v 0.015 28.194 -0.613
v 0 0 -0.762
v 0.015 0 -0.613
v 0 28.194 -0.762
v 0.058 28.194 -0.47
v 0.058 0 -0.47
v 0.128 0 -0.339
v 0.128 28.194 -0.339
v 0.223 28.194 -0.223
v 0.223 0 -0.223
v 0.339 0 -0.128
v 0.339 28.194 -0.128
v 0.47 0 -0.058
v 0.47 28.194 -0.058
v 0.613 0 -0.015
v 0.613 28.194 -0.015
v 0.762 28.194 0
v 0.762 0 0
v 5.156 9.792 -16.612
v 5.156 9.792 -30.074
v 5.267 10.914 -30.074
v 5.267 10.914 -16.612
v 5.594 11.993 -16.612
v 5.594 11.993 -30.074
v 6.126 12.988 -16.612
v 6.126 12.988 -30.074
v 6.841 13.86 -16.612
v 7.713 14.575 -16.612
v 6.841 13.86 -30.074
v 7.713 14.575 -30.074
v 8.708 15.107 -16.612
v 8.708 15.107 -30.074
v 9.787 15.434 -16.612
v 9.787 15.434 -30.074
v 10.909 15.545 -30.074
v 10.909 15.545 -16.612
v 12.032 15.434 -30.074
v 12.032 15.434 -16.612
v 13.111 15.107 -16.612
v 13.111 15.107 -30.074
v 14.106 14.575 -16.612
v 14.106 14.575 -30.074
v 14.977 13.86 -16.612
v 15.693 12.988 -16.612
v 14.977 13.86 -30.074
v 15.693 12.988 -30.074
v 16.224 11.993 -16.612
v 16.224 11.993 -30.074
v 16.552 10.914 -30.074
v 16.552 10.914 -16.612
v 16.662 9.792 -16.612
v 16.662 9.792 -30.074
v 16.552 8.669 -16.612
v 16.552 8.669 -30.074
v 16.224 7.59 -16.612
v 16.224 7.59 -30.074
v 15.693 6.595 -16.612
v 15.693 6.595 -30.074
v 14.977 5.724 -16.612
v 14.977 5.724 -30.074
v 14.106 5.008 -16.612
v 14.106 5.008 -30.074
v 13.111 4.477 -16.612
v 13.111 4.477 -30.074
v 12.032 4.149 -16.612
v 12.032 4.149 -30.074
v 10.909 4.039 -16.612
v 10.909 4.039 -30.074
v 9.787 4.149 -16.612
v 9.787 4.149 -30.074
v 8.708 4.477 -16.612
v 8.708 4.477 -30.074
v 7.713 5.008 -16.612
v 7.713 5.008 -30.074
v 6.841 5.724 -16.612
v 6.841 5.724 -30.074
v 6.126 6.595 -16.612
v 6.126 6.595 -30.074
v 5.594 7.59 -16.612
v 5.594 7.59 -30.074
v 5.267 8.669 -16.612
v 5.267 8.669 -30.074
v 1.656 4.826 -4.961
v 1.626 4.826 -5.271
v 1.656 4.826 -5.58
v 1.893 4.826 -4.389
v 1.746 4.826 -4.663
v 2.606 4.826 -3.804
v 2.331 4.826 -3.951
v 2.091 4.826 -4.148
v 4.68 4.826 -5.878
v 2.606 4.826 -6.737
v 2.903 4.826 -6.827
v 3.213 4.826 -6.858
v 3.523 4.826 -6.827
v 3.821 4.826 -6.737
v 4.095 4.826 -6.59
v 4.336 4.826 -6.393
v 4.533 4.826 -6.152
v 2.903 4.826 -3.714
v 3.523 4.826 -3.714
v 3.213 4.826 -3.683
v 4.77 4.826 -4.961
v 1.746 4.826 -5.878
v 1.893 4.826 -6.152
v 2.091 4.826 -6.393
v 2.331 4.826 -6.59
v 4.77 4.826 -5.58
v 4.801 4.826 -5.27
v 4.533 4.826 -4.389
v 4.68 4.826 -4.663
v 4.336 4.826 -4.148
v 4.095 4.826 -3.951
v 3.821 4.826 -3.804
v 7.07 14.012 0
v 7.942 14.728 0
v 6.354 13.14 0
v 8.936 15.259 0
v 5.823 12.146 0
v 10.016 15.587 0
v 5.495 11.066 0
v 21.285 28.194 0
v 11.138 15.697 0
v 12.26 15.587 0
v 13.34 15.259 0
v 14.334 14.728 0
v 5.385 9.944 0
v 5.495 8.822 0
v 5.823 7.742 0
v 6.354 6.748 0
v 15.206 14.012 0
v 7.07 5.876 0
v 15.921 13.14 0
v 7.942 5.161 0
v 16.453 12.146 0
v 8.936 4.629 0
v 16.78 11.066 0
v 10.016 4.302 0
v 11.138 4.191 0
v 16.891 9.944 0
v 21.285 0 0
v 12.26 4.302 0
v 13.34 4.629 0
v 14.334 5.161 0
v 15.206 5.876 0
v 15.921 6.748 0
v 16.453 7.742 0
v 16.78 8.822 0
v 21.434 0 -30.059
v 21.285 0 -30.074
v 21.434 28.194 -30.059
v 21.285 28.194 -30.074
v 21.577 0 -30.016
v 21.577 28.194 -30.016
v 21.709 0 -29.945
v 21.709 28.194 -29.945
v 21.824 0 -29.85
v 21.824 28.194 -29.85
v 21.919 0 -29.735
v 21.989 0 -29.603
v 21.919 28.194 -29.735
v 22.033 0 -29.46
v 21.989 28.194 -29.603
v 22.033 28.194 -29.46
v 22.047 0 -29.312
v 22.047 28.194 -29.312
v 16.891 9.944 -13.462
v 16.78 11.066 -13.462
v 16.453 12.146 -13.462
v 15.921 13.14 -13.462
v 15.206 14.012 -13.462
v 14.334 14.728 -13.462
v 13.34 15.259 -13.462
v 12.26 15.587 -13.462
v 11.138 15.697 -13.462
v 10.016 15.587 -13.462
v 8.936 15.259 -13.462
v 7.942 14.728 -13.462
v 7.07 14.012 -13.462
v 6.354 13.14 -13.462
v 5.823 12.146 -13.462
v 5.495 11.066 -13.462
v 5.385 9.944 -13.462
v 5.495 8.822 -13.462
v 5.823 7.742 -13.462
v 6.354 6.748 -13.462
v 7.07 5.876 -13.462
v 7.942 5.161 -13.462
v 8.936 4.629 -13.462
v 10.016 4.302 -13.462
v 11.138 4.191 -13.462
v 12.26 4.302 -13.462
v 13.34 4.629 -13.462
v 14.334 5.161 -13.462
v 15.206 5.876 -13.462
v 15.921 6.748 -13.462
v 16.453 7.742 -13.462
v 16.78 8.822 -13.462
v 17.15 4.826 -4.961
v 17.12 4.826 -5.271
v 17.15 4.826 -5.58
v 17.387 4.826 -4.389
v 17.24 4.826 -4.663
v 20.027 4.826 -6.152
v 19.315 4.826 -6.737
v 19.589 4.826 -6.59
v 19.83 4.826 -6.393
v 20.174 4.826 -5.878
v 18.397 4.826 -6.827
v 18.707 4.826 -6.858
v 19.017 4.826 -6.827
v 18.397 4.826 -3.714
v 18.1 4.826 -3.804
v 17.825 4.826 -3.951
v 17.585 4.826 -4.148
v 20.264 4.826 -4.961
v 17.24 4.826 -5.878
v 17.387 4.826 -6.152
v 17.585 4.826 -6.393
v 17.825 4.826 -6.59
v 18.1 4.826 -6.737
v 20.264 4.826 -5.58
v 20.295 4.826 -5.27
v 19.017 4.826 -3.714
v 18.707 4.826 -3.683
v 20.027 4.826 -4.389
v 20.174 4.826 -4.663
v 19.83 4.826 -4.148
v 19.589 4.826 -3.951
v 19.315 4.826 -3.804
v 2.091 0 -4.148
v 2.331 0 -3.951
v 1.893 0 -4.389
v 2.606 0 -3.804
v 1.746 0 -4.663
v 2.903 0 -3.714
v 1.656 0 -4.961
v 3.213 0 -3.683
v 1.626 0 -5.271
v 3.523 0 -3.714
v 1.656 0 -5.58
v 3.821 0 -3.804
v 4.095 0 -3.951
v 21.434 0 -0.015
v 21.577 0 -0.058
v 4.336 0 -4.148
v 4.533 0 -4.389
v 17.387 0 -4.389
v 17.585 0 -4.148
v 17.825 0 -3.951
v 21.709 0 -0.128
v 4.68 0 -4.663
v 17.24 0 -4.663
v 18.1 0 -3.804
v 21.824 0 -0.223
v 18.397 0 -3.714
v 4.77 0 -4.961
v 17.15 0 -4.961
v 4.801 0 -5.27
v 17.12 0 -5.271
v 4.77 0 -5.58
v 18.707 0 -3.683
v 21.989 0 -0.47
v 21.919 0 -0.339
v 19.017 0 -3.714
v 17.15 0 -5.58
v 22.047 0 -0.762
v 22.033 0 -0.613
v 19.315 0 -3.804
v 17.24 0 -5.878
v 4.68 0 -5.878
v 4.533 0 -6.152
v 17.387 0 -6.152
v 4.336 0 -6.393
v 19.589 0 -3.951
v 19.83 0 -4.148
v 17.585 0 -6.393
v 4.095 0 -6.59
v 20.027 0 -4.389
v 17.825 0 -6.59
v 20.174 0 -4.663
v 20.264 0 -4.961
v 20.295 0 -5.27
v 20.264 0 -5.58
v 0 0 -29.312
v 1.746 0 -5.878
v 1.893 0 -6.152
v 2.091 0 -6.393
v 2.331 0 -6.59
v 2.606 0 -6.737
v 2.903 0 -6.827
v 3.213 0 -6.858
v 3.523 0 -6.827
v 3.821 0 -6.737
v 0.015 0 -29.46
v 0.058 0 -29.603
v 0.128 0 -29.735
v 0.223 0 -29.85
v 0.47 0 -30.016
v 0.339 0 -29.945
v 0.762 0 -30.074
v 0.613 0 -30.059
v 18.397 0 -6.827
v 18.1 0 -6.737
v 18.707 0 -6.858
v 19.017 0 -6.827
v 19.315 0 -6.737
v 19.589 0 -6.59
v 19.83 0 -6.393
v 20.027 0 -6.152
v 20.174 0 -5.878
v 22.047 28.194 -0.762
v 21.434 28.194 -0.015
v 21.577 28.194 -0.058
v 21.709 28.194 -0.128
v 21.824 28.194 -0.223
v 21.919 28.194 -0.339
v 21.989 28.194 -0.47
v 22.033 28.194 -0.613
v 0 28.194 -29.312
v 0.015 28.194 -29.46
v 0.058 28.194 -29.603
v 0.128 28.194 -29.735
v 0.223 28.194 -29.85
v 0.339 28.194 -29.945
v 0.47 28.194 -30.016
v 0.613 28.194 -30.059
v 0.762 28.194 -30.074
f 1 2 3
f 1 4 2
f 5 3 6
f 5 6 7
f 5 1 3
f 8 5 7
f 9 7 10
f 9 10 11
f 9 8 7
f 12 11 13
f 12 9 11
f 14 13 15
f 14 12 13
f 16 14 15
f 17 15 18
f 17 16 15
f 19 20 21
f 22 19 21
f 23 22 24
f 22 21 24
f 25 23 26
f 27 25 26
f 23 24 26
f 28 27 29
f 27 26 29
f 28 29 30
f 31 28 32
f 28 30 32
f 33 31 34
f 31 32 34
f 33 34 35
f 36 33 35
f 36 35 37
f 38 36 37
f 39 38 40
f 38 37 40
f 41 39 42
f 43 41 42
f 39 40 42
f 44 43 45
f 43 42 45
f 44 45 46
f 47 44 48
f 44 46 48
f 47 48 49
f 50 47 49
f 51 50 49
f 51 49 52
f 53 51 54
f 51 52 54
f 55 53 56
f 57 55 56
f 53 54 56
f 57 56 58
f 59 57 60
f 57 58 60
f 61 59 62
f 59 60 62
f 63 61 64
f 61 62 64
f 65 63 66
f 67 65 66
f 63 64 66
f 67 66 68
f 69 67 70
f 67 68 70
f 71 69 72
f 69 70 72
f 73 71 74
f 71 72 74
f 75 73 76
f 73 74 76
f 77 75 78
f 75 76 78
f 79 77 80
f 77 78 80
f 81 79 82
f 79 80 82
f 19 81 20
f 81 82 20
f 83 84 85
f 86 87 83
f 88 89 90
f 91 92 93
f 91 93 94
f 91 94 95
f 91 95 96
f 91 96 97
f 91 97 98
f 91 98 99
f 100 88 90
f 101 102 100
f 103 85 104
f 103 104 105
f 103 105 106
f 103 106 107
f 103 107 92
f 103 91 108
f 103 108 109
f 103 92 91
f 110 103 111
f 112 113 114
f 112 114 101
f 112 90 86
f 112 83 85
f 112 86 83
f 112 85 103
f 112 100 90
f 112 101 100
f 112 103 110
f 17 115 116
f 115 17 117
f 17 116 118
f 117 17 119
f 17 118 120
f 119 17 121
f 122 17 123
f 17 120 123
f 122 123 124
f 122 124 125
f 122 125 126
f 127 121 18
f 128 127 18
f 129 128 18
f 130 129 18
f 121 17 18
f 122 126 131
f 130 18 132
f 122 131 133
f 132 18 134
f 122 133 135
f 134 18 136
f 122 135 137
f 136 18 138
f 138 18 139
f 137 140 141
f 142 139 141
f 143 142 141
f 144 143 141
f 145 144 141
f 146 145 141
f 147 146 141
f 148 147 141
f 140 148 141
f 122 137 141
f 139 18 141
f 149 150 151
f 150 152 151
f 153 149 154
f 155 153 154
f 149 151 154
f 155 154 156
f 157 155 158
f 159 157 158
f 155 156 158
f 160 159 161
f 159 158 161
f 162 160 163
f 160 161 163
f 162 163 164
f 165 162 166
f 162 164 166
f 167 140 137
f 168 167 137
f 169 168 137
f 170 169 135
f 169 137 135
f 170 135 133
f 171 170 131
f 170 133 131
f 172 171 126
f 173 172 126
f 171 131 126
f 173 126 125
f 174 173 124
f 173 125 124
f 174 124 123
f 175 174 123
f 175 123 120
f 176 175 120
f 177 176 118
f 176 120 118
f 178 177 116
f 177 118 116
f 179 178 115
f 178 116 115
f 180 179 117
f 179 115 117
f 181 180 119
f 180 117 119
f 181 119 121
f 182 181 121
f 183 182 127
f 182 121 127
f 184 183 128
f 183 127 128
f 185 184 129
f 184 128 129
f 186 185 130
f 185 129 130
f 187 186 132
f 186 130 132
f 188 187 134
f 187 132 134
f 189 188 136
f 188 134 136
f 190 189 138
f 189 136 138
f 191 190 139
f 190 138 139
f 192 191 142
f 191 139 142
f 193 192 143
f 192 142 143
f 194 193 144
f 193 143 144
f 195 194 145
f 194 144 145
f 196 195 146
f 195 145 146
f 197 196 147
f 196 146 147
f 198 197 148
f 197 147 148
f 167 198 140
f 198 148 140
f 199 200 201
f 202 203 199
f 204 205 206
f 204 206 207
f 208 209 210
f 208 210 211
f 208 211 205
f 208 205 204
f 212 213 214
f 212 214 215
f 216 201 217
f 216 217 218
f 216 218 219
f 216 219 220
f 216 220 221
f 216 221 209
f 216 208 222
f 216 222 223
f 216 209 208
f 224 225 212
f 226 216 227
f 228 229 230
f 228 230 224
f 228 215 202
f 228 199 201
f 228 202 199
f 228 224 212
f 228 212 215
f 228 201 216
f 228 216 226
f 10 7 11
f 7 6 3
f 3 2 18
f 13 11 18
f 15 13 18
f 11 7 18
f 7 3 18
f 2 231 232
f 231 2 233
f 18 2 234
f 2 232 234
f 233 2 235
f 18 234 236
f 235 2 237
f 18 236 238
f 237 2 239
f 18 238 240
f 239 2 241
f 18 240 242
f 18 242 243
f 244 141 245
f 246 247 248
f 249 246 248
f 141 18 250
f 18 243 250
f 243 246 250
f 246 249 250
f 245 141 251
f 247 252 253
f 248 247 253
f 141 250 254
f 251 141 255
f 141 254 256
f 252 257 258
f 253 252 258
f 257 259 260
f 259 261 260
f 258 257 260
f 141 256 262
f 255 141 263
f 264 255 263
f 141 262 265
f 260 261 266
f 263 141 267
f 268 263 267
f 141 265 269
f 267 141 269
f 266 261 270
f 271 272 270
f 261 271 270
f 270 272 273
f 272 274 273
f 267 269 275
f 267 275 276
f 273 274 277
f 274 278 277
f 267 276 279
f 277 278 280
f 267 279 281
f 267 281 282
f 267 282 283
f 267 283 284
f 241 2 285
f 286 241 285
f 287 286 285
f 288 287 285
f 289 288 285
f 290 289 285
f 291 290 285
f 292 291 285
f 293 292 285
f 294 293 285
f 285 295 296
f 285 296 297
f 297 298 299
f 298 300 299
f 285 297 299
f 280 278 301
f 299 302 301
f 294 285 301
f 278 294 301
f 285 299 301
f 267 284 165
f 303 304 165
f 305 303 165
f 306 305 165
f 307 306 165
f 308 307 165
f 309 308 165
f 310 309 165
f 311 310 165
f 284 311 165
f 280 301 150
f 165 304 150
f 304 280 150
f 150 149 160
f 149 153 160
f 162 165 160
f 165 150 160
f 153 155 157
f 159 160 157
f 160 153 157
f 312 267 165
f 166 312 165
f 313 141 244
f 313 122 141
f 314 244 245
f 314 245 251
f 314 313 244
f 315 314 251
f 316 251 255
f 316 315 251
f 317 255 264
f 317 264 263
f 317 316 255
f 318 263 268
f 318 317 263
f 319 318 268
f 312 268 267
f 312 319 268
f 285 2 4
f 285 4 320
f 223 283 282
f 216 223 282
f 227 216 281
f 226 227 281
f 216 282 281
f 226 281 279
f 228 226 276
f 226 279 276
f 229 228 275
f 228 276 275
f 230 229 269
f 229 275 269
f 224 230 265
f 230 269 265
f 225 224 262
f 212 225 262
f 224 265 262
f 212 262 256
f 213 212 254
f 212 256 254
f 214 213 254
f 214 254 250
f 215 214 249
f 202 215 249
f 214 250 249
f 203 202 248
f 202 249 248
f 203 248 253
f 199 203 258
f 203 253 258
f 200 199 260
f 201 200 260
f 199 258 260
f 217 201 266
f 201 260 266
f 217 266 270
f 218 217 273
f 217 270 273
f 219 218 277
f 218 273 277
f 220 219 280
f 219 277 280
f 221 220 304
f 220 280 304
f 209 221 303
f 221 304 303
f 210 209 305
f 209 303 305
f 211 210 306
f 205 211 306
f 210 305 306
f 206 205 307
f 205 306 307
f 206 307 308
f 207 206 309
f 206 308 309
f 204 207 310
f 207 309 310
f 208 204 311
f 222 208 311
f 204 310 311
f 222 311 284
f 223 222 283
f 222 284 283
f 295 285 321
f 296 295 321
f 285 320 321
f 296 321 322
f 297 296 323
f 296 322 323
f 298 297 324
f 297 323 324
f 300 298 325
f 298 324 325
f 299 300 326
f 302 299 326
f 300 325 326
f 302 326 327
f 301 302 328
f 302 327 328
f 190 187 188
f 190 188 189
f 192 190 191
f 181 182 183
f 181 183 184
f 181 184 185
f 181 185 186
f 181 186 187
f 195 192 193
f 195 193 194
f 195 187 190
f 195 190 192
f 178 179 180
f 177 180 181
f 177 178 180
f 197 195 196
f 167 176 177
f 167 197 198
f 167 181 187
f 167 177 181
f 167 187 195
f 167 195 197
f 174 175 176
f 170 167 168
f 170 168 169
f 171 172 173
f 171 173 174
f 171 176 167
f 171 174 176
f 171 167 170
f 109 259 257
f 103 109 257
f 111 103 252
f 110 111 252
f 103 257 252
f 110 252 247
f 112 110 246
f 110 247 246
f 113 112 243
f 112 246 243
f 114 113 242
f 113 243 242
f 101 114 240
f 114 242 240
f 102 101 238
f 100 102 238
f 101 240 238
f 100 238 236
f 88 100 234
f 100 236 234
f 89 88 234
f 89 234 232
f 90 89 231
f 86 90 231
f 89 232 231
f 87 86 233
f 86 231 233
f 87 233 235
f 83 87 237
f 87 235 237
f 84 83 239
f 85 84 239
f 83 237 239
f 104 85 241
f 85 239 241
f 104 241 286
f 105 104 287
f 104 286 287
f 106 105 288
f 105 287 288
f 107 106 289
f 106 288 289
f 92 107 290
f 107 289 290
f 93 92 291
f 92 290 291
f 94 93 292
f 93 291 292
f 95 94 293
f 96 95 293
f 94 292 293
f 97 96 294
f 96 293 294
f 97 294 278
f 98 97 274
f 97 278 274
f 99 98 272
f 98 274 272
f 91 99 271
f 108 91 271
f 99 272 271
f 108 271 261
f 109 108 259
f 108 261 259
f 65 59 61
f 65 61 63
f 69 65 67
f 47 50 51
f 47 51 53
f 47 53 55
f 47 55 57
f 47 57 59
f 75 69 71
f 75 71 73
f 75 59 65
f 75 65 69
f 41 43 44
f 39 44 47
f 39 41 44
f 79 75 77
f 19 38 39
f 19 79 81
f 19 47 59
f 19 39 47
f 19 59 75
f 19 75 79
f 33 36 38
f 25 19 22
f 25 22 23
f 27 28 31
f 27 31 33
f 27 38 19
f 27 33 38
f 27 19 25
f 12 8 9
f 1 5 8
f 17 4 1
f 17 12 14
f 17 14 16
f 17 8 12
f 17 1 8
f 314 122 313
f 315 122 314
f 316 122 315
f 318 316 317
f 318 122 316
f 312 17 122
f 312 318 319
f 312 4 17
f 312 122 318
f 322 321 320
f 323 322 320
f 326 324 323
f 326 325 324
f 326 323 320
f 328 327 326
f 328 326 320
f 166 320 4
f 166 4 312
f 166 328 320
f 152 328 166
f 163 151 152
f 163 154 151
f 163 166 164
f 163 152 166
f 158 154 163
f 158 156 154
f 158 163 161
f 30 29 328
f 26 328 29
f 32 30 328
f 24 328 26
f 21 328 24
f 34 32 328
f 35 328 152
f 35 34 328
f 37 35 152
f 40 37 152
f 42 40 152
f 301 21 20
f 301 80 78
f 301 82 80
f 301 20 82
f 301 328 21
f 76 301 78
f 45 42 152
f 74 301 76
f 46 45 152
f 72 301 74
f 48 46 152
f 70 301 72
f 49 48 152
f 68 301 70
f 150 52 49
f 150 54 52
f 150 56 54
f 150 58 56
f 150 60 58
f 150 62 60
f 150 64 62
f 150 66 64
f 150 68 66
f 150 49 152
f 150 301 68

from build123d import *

# Parameters (mm, degrees)
SKETCH1_W           = 22.0472
SKETCH1_H           = 30.0736
BOSS_EXTRUDE1_DEPTH = 28.194
SKETCH2_R           = 1.5875
CUT_EXTRUDE1_DEPTH  = 4.826
SKETCH3_R           = 5.7531
CUT_EXTRUDE2_DEPTH  = 13.462
SKETCH4_R           = 5.7531
CUT_EXTRUDE3_DEPTH  = 13.462
FILLET1_R           = 0.762


with BuildPart() as part:
    # Sketch1 → Boss-Extrude1 (new body)
    with BuildSketch(Plane(origin=(0, 0, 0), x_dir=(1, 0, 0), z_dir=(0, 1, 0))):
        with Locations((11.0236, 15.0368)):
            Rectangle(SKETCH1_W, SKETCH1_H)
    extrude(amount=BOSS_EXTRUDE1_DEPTH)

    # Sketch2 → Cut-Extrude1 (cut)
    with BuildSketch(Plane.XZ):
        with Locations((3.2131, -5.2705)):
            Circle(SKETCH2_R)
        with Locations((18.7071, -5.2705)):
            Circle(SKETCH2_R)
    extrude(amount=-CUT_EXTRUDE1_DEPTH, mode=Mode.SUBTRACT)

    # Sketch3 → Cut-Extrude2 (cut)
    with BuildSketch(Plane.XY):
        with Locations((11.1379, 9.9441)):
            Circle(SKETCH3_R)
    extrude(amount=-CUT_EXTRUDE2_DEPTH, mode=Mode.SUBTRACT)

    # Sketch4 → Cut-Extrude3 (cut)
    with BuildSketch(Plane(origin=(0, 0, -30.0736), x_dir=(-1, 0, 0), z_dir=(0, 0, -1))):
        with Locations((-10.9093, 9.7917)):
            Circle(SKETCH4_R)
    extrude(amount=-CUT_EXTRUDE3_DEPTH, mode=Mode.SUBTRACT)

    # Fillet1
    fillet1_edges = [part.edges().sort_by_distance(p)[0] for p in [
        (0, 14.097, -30.0736),
        (22.0472, 14.097, -30.0736),
        (22.0472, 14.097, 0),
        (0, 14.097, 0),
    ]]
    fillet(fillet1_edges, radius=FILLET1_R)


solid = part.part
